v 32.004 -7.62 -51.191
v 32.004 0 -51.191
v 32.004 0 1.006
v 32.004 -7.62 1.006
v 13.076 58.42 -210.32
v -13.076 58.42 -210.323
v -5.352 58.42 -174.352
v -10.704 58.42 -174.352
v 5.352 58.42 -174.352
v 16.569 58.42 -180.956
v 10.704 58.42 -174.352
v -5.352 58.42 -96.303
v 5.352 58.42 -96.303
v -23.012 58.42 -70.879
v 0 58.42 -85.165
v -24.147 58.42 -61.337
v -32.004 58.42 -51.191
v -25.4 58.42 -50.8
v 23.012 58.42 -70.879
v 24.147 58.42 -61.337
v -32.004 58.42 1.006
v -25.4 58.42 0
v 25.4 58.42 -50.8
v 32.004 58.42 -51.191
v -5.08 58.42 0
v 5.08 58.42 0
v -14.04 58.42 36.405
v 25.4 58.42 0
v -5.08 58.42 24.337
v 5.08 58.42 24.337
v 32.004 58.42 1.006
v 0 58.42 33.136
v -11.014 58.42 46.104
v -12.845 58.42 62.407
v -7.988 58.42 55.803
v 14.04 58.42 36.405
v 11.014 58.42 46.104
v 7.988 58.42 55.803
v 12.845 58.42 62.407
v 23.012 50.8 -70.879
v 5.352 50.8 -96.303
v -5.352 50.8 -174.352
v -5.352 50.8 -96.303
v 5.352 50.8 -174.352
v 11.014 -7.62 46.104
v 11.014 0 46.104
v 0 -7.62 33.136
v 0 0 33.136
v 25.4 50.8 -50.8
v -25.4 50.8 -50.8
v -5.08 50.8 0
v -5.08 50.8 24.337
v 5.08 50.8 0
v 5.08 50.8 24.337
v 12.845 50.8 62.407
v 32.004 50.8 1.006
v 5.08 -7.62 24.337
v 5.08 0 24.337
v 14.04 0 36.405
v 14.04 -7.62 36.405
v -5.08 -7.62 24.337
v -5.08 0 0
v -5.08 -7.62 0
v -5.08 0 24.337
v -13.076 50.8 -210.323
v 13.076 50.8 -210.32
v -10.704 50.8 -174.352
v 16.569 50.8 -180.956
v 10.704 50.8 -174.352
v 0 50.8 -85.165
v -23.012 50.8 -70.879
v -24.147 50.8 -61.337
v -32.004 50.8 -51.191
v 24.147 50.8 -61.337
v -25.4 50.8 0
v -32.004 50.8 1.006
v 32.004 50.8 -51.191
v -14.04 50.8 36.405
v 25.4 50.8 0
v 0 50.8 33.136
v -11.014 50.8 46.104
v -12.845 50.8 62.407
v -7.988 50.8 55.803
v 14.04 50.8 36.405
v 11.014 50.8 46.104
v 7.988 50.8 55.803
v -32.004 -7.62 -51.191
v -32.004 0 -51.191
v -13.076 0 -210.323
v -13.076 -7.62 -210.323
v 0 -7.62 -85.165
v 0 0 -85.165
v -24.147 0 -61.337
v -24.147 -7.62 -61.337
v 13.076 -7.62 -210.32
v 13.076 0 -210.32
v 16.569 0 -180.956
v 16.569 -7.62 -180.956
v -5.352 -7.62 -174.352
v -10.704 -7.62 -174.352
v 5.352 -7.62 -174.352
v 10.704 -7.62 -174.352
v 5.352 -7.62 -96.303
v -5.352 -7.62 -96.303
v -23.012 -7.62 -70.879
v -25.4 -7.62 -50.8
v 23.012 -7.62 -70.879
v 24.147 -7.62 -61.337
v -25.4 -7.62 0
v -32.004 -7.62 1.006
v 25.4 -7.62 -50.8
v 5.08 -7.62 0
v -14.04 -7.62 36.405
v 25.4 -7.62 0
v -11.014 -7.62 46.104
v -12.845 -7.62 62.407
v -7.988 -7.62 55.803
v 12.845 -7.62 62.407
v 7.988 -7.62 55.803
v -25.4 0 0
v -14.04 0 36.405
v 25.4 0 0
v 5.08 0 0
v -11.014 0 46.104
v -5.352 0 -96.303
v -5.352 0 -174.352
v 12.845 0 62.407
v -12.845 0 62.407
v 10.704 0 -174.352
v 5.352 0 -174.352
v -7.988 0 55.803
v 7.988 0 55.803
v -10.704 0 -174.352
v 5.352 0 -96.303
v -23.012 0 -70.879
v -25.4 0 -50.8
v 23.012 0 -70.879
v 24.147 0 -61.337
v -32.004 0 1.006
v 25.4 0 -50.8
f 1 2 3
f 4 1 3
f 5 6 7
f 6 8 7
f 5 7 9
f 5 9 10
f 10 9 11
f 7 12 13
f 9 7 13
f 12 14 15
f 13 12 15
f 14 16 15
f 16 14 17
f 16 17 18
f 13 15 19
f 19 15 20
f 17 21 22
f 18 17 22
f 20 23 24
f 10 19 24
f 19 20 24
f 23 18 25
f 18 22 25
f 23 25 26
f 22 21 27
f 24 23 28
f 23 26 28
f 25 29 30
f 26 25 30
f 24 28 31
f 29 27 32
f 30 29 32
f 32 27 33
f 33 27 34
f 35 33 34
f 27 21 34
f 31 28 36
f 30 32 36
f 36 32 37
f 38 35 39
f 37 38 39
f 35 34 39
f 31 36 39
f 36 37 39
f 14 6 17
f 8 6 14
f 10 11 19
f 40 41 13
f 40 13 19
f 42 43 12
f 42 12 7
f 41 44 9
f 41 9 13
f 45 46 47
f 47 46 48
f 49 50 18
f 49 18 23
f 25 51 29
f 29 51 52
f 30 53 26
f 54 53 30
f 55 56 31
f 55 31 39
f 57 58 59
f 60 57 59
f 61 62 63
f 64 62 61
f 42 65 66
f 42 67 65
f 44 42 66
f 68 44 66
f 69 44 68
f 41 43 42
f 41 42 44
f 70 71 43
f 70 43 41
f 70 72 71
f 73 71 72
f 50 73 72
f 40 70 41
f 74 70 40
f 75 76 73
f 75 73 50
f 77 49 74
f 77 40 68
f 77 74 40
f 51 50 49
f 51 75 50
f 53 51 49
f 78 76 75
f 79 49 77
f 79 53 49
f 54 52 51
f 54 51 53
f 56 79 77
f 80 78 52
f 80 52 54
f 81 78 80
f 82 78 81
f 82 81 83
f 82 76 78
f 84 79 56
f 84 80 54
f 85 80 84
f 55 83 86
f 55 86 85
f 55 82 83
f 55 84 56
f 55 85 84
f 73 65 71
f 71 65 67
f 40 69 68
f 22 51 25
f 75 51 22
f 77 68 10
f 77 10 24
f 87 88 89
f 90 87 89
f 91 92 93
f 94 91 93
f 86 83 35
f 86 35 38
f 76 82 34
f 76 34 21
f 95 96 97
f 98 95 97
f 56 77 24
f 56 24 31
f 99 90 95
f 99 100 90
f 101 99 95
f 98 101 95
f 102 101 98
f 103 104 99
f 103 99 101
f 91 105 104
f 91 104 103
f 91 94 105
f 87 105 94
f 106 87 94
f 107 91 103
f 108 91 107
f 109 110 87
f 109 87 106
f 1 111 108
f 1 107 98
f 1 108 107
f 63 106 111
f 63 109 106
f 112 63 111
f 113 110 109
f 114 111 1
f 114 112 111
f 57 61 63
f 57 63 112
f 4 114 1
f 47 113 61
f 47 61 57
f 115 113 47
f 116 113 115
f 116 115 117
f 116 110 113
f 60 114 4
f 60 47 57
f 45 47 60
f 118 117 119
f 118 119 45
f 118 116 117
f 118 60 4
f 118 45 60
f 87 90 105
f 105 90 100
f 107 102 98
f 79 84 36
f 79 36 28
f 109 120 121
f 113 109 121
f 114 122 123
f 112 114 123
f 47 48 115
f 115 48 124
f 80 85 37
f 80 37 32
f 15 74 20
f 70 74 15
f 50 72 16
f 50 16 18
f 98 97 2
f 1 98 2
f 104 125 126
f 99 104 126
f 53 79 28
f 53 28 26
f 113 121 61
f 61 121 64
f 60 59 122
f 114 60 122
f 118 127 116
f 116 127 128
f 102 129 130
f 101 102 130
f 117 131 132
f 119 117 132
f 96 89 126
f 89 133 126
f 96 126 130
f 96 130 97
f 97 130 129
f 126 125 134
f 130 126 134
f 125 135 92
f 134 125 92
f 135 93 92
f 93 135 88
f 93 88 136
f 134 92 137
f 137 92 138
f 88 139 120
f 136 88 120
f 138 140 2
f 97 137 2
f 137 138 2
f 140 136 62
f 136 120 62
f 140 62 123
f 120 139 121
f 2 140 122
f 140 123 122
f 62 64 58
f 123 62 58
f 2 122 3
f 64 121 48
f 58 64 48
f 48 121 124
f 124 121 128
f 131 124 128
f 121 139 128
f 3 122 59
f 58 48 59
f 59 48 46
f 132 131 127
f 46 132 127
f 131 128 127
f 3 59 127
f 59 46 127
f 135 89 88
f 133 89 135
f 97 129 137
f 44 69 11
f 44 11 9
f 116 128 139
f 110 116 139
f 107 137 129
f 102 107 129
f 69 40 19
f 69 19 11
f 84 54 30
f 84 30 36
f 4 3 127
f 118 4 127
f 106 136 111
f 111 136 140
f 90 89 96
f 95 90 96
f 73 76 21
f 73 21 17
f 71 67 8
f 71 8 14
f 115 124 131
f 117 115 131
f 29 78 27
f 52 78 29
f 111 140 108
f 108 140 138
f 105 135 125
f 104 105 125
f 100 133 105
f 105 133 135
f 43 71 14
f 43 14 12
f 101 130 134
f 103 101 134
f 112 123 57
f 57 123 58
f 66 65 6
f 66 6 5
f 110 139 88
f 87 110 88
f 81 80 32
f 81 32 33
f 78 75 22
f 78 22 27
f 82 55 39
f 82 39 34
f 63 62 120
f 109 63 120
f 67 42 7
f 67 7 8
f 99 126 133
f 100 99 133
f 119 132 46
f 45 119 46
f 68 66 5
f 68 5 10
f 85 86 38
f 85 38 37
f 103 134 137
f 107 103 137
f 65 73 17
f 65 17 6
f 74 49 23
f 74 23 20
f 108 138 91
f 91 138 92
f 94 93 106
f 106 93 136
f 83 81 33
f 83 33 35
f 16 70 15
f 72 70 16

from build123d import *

# Parameters (mm, degrees)
F0_W     = 10.16
F0_H     = 24.3368128691
F2_DEPTH = 7.62
F3_DEPTH = 7.62


with BuildPart() as f2:
    # F0 (on Front) → F2 (new body)
    with BuildSketch(Plane.XZ):
        Polygon((-12.8450196363, 62.4070629297), (-32.0040002187, 1.0064022663), (-32.0040002187, -51.1913775905), (-16.5690759636, -180.9563927729), (0, -180.9563927729), (16.5690759636, -180.9563927729), (32.0040002187, -51.1913775905), (32.0040002187, 1.0064022663), (12.8450196363, 62.4070629297), (0, 62.4070629297), align=None)
        Polygon((-25.4, -50.8), (-25.4, 0), (-14.0403296378, 36.4054476782), (-11.013989809, 46.1042551946), (-7.9876499802, 55.803062711), (0, 55.803062711), (7.9876499802, 55.803062711), (11.013989809, 46.1042551946), (14.0403296378, 36.4054476782), (25.4, 0), (25.4, -50.8), (24.1467196463, -61.3366208112), (23.01173757, -70.8786803595), (10.7040373175, -174.3523925543), (5.3520186588, -174.3523925543), (0, -174.3523925543), (-5.3520186588, -174.3523925543), (-10.7040373175, -174.3523925543), (-23.01173757, -70.8786803595), (-24.1467196463, -61.3366208112), align=None, mode=Mode.SUBTRACT)
        Polygon((-5.08, 0), (-25.4, 0), (-25.4, -50.8), (25.4, -50.8), (25.4, 0), (5.08, 0), align=None)
        Polygon((5.3520186588, -96.3033139706), (-5.3520186588, -96.3033139706), (-5.3520186588, -174.3523925543), (0, -174.3523925543), (5.3520186588, -174.3523925543), align=None)
        Polygon((0, -85.1645011197), (-24.1467196463, -61.3366208112), (-23.01173757, -70.8786803595), (-5.3520186588, -96.3033139706), align=None)
        Polygon((23.01173757, -70.8786803595), (24.1467196463, -61.3366208112), (0, -85.1645011197), (5.3520186588, -96.3033139706), align=None)
        with Locations((0, 12.1684064346)):
            Rectangle(F0_W, F0_H)
        Polygon((0, 33.1356309716), (5.08, 24.3368128691), (14.0403296378, 36.4054476782), (11.013989809, 46.1042551946), align=None)
        Polygon((-11.013989809, 46.1042551946), (-14.0403296378, 36.4054476782), (-5.08, 24.3368128691), (0, 33.1356309716), align=None)
        Polygon((5.3520186588, -96.3033139706), (0, -85.1645011197), (-5.3520186588, -96.3033139706), align=None)
        Polygon((0, 33.1356309716), (-5.08, 24.3368128691), (5.08, 24.3368128691), align=None)
    extrude(amount=F2_DEPTH)

    # F0 (on Front) → F3 (join)
    with BuildSketch(Plane.XZ):
        Polygon((0, -180.9563927729), (-16.5690759636, -180.9563927729), (-13.0761187439, -210.3225003842), (13.0764695727, -210.3195508841), (16.5690759636, -180.9563927729), align=None)
    extrude(amount=F3_DEPTH)


with BuildPart() as f4_1:
    # F4: instance of F2
    add(f2.part.mirror(Plane.XZ.offset(-25.4)))


solid = Compound([f2.part, f4_1.part])
